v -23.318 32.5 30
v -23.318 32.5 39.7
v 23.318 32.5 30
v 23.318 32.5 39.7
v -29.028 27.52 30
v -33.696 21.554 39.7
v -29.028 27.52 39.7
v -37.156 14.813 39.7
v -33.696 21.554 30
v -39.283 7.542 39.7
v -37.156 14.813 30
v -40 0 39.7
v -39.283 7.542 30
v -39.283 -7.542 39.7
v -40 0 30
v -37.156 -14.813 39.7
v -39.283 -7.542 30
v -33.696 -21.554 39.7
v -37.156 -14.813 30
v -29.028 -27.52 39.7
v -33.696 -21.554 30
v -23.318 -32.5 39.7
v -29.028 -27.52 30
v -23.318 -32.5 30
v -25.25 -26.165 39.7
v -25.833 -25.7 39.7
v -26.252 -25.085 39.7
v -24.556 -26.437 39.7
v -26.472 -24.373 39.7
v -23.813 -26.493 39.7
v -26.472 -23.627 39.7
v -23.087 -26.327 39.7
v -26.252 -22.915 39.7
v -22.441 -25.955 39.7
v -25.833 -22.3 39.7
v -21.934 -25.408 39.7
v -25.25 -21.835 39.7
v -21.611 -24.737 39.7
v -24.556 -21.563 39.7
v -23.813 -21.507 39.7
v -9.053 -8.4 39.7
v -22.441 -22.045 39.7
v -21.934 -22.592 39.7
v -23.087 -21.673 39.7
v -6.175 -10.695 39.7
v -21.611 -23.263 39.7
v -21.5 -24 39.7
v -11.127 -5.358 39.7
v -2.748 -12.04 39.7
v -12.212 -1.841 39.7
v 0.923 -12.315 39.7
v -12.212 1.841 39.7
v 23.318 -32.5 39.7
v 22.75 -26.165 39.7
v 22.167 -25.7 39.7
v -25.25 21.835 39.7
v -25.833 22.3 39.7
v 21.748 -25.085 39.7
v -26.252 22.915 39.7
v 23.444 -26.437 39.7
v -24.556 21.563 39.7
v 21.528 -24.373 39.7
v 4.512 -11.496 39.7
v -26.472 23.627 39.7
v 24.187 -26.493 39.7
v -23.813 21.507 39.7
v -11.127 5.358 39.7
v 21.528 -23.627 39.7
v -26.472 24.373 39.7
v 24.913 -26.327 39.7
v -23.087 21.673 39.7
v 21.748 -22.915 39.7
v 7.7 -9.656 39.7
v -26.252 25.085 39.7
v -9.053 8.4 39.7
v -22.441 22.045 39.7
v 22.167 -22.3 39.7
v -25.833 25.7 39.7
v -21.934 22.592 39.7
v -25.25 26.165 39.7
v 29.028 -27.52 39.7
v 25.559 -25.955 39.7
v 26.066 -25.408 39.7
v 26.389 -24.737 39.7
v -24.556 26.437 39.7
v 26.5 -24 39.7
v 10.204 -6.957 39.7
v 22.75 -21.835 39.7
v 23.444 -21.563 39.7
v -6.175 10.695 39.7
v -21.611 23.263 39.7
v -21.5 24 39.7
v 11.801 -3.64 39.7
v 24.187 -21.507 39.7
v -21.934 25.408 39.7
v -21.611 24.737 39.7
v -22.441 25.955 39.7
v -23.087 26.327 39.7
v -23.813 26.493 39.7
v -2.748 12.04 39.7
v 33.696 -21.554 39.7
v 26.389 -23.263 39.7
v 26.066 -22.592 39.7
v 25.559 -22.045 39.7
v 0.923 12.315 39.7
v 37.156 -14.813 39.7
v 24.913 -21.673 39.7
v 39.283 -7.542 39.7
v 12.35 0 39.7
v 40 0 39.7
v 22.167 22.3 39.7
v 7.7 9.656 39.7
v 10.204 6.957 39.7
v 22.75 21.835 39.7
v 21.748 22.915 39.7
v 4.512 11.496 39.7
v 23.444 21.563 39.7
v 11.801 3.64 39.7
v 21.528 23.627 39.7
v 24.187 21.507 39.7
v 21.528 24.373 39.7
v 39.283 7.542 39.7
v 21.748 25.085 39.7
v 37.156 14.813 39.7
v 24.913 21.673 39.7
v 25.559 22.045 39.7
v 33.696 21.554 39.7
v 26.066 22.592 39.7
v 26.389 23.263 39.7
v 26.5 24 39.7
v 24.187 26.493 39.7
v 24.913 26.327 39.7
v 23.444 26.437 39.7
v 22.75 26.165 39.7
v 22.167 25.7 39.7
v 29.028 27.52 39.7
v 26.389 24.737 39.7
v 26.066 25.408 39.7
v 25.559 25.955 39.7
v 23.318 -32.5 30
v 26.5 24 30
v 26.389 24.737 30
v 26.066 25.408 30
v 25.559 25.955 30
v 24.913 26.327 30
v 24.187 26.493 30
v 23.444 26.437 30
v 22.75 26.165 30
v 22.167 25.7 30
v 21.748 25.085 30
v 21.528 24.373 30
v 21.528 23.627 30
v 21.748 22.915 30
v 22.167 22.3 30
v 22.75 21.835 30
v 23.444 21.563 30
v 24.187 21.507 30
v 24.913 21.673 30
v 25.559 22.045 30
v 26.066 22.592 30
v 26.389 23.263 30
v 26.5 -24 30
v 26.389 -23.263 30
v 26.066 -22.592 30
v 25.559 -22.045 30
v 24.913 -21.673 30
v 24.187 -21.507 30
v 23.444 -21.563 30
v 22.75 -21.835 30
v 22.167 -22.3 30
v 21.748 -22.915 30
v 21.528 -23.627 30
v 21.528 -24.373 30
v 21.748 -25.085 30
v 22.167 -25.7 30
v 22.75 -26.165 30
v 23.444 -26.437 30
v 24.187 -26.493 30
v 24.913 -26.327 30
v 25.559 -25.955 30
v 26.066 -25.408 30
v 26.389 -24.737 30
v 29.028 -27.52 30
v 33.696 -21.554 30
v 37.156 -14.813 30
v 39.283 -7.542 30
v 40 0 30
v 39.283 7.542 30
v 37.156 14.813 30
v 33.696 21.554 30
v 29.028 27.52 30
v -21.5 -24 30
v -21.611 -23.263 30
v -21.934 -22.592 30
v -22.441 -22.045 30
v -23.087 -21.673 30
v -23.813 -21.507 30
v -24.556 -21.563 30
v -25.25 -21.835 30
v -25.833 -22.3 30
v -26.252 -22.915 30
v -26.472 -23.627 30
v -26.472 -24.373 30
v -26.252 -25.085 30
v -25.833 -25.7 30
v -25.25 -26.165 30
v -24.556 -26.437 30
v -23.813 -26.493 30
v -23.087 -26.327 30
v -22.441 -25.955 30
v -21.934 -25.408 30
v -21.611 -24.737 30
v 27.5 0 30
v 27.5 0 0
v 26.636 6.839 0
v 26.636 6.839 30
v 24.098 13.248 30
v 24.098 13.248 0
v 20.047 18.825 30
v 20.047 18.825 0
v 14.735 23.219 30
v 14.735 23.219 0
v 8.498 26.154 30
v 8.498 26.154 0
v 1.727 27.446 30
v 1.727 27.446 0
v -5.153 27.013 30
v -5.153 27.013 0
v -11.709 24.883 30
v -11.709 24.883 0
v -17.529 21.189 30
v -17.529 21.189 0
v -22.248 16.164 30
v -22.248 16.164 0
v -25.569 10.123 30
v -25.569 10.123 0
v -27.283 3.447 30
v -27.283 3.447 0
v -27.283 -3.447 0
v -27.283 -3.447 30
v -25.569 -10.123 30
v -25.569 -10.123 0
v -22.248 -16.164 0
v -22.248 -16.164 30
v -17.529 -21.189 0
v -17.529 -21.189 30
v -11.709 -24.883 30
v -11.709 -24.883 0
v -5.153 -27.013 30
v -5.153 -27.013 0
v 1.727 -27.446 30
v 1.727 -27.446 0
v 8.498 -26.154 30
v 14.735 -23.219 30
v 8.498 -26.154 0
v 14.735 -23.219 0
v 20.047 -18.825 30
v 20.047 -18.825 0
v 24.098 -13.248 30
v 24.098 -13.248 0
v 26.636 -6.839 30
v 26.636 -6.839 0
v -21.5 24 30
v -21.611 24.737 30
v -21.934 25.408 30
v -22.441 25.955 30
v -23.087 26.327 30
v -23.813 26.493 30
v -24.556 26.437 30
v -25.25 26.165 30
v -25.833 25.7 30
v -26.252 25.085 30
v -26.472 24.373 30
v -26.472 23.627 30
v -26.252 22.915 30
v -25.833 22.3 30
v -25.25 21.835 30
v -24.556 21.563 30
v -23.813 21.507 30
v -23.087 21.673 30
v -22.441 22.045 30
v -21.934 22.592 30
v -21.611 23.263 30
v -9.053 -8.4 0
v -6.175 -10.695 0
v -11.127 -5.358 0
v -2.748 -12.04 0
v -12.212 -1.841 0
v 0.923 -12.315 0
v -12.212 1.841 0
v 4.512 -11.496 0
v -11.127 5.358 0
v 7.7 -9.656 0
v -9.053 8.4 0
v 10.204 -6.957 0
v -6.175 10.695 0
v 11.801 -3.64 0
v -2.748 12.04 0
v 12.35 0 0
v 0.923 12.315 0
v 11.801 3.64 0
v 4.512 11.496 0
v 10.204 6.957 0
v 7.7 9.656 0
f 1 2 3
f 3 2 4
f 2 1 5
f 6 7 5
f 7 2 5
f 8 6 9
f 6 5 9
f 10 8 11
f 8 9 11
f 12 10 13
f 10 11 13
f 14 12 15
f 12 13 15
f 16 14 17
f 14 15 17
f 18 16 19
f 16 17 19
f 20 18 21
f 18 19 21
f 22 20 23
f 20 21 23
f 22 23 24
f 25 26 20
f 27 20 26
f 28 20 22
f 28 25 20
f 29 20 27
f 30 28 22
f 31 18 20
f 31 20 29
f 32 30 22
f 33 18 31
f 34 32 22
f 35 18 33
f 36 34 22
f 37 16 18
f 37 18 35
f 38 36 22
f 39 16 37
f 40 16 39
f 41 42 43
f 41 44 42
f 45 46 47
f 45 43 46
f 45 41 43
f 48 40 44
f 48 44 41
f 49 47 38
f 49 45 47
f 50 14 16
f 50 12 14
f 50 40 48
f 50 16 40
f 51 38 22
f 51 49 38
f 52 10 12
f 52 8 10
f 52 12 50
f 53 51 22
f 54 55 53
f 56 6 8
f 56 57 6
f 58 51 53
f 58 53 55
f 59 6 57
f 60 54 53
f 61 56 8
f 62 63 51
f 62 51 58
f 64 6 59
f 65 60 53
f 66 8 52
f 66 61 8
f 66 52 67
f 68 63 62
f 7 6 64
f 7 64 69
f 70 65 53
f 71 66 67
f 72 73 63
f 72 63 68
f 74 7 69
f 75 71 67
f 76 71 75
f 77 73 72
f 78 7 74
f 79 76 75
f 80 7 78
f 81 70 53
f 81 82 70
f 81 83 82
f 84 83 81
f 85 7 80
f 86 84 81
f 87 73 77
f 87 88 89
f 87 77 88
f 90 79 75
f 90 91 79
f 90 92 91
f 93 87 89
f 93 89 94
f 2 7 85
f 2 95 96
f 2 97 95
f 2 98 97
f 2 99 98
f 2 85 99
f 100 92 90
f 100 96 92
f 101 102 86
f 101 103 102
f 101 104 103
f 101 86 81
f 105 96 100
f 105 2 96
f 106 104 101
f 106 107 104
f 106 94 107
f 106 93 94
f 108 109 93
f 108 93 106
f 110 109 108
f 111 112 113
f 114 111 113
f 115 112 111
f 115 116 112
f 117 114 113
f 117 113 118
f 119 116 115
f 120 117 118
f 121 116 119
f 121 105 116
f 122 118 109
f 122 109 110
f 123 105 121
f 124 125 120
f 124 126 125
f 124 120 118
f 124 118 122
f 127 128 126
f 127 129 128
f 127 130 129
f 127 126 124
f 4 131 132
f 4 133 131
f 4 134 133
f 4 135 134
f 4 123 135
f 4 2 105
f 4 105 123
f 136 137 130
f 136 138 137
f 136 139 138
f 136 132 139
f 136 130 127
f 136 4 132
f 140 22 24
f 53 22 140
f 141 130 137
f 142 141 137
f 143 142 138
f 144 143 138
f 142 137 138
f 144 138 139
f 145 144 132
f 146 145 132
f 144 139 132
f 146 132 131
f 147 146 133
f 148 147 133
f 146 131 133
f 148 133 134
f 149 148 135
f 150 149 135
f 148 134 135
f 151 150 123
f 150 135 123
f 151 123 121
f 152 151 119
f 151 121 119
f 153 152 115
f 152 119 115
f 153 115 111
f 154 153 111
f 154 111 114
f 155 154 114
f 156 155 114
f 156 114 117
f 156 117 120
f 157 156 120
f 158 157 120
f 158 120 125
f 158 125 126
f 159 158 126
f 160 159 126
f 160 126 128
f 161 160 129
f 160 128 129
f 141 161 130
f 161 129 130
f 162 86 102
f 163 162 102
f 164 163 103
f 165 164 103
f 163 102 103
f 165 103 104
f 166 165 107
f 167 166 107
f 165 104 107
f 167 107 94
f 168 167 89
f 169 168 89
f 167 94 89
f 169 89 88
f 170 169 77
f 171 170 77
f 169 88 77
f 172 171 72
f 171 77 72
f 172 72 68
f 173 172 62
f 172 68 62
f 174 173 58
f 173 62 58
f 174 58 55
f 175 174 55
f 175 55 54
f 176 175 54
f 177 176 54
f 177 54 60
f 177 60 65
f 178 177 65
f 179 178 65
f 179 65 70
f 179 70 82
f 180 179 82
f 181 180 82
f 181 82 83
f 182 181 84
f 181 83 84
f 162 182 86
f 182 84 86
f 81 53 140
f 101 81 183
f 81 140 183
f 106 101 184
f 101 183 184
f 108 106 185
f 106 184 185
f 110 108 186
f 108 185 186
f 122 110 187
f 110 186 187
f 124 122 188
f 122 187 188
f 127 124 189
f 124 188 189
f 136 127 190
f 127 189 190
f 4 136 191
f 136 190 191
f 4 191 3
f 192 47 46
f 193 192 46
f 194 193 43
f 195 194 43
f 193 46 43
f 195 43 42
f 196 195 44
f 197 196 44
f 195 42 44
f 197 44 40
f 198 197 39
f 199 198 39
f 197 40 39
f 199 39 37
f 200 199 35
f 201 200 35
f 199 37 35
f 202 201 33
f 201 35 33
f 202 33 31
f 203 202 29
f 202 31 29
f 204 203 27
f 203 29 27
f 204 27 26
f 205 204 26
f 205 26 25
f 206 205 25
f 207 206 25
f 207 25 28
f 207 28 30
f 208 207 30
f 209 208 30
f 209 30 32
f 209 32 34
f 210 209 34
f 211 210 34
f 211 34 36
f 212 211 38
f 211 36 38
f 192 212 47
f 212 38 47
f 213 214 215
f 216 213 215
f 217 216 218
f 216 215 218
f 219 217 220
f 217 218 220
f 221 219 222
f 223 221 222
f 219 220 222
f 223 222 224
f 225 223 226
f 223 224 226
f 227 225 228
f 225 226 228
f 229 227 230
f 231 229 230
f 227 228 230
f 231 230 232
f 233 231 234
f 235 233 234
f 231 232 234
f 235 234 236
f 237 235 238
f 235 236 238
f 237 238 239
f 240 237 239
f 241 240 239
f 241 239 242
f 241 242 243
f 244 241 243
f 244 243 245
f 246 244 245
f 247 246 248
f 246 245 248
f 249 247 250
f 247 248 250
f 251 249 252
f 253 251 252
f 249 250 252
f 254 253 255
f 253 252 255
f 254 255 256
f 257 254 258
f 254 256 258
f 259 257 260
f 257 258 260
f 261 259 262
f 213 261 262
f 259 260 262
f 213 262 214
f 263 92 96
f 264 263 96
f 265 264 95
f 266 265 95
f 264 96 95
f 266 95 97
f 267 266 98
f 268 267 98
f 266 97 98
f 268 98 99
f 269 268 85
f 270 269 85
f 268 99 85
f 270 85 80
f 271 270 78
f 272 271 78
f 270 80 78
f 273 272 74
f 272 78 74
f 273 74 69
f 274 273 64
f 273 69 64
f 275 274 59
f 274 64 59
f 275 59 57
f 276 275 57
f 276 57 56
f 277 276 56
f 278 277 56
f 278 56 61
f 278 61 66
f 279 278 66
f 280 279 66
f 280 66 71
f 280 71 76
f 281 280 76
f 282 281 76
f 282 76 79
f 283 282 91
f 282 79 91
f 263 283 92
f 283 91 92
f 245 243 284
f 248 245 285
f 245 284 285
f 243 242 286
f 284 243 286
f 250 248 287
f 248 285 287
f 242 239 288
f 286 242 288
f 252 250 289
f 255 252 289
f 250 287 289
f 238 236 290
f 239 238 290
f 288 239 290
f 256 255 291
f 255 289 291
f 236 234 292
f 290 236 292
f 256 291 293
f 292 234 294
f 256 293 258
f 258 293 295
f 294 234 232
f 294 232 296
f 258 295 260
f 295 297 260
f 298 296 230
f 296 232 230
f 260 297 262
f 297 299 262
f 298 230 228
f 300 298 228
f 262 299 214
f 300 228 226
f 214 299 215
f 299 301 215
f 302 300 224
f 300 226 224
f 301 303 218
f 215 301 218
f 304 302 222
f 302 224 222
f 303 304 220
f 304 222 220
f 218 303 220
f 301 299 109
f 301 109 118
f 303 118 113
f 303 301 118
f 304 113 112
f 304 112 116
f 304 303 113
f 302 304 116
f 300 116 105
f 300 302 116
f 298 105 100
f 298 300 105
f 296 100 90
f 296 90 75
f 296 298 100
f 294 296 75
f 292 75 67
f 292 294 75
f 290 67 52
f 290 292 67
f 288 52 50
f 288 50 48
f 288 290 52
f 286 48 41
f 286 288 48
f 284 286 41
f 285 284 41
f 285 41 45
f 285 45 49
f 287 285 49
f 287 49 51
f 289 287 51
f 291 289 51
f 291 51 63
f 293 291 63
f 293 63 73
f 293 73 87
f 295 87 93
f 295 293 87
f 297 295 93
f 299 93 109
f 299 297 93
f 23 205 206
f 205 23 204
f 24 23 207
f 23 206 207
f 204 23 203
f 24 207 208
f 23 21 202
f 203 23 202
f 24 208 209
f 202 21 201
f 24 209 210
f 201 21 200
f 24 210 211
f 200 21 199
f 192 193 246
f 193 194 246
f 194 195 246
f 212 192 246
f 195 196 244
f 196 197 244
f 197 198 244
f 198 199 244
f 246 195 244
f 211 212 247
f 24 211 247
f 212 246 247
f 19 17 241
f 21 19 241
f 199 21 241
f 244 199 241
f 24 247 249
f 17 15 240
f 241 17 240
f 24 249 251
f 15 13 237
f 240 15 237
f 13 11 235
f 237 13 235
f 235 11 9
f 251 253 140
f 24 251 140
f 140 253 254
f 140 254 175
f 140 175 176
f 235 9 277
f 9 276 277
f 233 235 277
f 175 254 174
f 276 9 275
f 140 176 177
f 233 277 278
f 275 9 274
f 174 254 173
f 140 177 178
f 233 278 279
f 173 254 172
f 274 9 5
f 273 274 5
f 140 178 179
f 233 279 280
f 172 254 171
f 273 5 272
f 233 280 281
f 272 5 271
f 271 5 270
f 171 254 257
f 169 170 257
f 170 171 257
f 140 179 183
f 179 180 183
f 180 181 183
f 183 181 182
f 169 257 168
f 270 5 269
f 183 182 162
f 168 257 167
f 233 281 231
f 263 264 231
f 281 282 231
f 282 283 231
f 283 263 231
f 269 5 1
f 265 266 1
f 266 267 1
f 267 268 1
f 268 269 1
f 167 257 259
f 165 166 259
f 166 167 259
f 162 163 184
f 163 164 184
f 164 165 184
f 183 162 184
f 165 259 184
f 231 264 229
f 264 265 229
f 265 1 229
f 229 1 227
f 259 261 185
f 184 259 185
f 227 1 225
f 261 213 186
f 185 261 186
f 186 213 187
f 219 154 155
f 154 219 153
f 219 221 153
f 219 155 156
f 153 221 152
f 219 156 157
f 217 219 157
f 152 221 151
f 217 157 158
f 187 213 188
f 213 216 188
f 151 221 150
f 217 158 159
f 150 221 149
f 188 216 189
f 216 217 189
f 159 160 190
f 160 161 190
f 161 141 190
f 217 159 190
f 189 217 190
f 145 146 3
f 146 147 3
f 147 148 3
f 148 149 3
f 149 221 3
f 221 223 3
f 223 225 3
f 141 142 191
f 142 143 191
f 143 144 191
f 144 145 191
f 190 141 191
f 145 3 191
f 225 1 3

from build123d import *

# Parameters (mm, degrees)
SZKIC1_R                    = 27.5
DODANIE_WYCI_GNI_CIE1_DEPTH = 30
SZKIC2_R                    = 40
DODANIE_WYCI_GNI_CIE2_DEPTH = 9.7
SZKIC3_W                    = 108.783825326
SZKIC3_H                    = 7.5
WYTNIJ_WYCI_GNI_CIE1_DEPTH  = 9.7
SZKIC5_W                    = 108.783825325
SZKIC5_H                    = 7.5
WYTNIJ_WYCI_GNI_CIE2_DEPTH  = 9.7
SZKIC6_R                    = 12.35
WYTNIJ_WYCI_GNI_CIE3_DEPTH  = 39.7
SZKIC7_R                    = 2.5
WYTNIJ_WYCI_GNI_CIE4_DEPTH  = 9.7


with BuildPart() as part:
    # Szkic1 → Dodanie-wyciągnięcie1 (new body)
    with BuildSketch(Plane.XY):
        Circle(SZKIC1_R)
    extrude(amount=DODANIE_WYCI_GNI_CIE1_DEPTH)

    # Szkic2 → Dodanie-wyciągnięcie2 (add)
    with BuildSketch(Plane.XY.offset(30)):
        Circle(SZKIC2_R)
    extrude(amount=DODANIE_WYCI_GNI_CIE2_DEPTH)

    # Szkic3 → Wytnij-wyciągnięcie1 (cut)
    with BuildSketch(Plane.XY.offset(39.7)):
        with Locations((-0.621798063, 36.25)):
            Rectangle(SZKIC3_W, SZKIC3_H)
    extrude(amount=-WYTNIJ_WYCI_GNI_CIE1_DEPTH, mode=Mode.SUBTRACT)

    # Szkic5 → Wytnij-wyciągnięcie2 (cut)
    with BuildSketch(Plane.XY.offset(39.7)):
        with Locations((-3.409138593, -36.25)):
            Rectangle(SZKIC5_W, SZKIC5_H)
    extrude(amount=-WYTNIJ_WYCI_GNI_CIE2_DEPTH, mode=Mode.SUBTRACT)

    # Szkic6 → Wytnij-wyciągnięcie3 (cut)
    with BuildSketch(Plane.XY):
        Circle(SZKIC6_R)
    extrude(amount=WYTNIJ_WYCI_GNI_CIE3_DEPTH, mode=Mode.SUBTRACT)

    # Szkic7 → Wytnij-wyciągnięcie4 (cut)
    with BuildSketch(Plane.XY.offset(39.7)):
        with Locations((-24, 24)):
            Circle(SZKIC7_R)
        with Locations((24, 24)):
            Circle(SZKIC7_R)
        with Locations((-24, -24)):
            Circle(SZKIC7_R)
        with Locations((24, -24)):
            Circle(SZKIC7_R)
    extrude(amount=-WYTNIJ_WYCI_GNI_CIE4_DEPTH, mode=Mode.SUBTRACT)


solid = part.part
